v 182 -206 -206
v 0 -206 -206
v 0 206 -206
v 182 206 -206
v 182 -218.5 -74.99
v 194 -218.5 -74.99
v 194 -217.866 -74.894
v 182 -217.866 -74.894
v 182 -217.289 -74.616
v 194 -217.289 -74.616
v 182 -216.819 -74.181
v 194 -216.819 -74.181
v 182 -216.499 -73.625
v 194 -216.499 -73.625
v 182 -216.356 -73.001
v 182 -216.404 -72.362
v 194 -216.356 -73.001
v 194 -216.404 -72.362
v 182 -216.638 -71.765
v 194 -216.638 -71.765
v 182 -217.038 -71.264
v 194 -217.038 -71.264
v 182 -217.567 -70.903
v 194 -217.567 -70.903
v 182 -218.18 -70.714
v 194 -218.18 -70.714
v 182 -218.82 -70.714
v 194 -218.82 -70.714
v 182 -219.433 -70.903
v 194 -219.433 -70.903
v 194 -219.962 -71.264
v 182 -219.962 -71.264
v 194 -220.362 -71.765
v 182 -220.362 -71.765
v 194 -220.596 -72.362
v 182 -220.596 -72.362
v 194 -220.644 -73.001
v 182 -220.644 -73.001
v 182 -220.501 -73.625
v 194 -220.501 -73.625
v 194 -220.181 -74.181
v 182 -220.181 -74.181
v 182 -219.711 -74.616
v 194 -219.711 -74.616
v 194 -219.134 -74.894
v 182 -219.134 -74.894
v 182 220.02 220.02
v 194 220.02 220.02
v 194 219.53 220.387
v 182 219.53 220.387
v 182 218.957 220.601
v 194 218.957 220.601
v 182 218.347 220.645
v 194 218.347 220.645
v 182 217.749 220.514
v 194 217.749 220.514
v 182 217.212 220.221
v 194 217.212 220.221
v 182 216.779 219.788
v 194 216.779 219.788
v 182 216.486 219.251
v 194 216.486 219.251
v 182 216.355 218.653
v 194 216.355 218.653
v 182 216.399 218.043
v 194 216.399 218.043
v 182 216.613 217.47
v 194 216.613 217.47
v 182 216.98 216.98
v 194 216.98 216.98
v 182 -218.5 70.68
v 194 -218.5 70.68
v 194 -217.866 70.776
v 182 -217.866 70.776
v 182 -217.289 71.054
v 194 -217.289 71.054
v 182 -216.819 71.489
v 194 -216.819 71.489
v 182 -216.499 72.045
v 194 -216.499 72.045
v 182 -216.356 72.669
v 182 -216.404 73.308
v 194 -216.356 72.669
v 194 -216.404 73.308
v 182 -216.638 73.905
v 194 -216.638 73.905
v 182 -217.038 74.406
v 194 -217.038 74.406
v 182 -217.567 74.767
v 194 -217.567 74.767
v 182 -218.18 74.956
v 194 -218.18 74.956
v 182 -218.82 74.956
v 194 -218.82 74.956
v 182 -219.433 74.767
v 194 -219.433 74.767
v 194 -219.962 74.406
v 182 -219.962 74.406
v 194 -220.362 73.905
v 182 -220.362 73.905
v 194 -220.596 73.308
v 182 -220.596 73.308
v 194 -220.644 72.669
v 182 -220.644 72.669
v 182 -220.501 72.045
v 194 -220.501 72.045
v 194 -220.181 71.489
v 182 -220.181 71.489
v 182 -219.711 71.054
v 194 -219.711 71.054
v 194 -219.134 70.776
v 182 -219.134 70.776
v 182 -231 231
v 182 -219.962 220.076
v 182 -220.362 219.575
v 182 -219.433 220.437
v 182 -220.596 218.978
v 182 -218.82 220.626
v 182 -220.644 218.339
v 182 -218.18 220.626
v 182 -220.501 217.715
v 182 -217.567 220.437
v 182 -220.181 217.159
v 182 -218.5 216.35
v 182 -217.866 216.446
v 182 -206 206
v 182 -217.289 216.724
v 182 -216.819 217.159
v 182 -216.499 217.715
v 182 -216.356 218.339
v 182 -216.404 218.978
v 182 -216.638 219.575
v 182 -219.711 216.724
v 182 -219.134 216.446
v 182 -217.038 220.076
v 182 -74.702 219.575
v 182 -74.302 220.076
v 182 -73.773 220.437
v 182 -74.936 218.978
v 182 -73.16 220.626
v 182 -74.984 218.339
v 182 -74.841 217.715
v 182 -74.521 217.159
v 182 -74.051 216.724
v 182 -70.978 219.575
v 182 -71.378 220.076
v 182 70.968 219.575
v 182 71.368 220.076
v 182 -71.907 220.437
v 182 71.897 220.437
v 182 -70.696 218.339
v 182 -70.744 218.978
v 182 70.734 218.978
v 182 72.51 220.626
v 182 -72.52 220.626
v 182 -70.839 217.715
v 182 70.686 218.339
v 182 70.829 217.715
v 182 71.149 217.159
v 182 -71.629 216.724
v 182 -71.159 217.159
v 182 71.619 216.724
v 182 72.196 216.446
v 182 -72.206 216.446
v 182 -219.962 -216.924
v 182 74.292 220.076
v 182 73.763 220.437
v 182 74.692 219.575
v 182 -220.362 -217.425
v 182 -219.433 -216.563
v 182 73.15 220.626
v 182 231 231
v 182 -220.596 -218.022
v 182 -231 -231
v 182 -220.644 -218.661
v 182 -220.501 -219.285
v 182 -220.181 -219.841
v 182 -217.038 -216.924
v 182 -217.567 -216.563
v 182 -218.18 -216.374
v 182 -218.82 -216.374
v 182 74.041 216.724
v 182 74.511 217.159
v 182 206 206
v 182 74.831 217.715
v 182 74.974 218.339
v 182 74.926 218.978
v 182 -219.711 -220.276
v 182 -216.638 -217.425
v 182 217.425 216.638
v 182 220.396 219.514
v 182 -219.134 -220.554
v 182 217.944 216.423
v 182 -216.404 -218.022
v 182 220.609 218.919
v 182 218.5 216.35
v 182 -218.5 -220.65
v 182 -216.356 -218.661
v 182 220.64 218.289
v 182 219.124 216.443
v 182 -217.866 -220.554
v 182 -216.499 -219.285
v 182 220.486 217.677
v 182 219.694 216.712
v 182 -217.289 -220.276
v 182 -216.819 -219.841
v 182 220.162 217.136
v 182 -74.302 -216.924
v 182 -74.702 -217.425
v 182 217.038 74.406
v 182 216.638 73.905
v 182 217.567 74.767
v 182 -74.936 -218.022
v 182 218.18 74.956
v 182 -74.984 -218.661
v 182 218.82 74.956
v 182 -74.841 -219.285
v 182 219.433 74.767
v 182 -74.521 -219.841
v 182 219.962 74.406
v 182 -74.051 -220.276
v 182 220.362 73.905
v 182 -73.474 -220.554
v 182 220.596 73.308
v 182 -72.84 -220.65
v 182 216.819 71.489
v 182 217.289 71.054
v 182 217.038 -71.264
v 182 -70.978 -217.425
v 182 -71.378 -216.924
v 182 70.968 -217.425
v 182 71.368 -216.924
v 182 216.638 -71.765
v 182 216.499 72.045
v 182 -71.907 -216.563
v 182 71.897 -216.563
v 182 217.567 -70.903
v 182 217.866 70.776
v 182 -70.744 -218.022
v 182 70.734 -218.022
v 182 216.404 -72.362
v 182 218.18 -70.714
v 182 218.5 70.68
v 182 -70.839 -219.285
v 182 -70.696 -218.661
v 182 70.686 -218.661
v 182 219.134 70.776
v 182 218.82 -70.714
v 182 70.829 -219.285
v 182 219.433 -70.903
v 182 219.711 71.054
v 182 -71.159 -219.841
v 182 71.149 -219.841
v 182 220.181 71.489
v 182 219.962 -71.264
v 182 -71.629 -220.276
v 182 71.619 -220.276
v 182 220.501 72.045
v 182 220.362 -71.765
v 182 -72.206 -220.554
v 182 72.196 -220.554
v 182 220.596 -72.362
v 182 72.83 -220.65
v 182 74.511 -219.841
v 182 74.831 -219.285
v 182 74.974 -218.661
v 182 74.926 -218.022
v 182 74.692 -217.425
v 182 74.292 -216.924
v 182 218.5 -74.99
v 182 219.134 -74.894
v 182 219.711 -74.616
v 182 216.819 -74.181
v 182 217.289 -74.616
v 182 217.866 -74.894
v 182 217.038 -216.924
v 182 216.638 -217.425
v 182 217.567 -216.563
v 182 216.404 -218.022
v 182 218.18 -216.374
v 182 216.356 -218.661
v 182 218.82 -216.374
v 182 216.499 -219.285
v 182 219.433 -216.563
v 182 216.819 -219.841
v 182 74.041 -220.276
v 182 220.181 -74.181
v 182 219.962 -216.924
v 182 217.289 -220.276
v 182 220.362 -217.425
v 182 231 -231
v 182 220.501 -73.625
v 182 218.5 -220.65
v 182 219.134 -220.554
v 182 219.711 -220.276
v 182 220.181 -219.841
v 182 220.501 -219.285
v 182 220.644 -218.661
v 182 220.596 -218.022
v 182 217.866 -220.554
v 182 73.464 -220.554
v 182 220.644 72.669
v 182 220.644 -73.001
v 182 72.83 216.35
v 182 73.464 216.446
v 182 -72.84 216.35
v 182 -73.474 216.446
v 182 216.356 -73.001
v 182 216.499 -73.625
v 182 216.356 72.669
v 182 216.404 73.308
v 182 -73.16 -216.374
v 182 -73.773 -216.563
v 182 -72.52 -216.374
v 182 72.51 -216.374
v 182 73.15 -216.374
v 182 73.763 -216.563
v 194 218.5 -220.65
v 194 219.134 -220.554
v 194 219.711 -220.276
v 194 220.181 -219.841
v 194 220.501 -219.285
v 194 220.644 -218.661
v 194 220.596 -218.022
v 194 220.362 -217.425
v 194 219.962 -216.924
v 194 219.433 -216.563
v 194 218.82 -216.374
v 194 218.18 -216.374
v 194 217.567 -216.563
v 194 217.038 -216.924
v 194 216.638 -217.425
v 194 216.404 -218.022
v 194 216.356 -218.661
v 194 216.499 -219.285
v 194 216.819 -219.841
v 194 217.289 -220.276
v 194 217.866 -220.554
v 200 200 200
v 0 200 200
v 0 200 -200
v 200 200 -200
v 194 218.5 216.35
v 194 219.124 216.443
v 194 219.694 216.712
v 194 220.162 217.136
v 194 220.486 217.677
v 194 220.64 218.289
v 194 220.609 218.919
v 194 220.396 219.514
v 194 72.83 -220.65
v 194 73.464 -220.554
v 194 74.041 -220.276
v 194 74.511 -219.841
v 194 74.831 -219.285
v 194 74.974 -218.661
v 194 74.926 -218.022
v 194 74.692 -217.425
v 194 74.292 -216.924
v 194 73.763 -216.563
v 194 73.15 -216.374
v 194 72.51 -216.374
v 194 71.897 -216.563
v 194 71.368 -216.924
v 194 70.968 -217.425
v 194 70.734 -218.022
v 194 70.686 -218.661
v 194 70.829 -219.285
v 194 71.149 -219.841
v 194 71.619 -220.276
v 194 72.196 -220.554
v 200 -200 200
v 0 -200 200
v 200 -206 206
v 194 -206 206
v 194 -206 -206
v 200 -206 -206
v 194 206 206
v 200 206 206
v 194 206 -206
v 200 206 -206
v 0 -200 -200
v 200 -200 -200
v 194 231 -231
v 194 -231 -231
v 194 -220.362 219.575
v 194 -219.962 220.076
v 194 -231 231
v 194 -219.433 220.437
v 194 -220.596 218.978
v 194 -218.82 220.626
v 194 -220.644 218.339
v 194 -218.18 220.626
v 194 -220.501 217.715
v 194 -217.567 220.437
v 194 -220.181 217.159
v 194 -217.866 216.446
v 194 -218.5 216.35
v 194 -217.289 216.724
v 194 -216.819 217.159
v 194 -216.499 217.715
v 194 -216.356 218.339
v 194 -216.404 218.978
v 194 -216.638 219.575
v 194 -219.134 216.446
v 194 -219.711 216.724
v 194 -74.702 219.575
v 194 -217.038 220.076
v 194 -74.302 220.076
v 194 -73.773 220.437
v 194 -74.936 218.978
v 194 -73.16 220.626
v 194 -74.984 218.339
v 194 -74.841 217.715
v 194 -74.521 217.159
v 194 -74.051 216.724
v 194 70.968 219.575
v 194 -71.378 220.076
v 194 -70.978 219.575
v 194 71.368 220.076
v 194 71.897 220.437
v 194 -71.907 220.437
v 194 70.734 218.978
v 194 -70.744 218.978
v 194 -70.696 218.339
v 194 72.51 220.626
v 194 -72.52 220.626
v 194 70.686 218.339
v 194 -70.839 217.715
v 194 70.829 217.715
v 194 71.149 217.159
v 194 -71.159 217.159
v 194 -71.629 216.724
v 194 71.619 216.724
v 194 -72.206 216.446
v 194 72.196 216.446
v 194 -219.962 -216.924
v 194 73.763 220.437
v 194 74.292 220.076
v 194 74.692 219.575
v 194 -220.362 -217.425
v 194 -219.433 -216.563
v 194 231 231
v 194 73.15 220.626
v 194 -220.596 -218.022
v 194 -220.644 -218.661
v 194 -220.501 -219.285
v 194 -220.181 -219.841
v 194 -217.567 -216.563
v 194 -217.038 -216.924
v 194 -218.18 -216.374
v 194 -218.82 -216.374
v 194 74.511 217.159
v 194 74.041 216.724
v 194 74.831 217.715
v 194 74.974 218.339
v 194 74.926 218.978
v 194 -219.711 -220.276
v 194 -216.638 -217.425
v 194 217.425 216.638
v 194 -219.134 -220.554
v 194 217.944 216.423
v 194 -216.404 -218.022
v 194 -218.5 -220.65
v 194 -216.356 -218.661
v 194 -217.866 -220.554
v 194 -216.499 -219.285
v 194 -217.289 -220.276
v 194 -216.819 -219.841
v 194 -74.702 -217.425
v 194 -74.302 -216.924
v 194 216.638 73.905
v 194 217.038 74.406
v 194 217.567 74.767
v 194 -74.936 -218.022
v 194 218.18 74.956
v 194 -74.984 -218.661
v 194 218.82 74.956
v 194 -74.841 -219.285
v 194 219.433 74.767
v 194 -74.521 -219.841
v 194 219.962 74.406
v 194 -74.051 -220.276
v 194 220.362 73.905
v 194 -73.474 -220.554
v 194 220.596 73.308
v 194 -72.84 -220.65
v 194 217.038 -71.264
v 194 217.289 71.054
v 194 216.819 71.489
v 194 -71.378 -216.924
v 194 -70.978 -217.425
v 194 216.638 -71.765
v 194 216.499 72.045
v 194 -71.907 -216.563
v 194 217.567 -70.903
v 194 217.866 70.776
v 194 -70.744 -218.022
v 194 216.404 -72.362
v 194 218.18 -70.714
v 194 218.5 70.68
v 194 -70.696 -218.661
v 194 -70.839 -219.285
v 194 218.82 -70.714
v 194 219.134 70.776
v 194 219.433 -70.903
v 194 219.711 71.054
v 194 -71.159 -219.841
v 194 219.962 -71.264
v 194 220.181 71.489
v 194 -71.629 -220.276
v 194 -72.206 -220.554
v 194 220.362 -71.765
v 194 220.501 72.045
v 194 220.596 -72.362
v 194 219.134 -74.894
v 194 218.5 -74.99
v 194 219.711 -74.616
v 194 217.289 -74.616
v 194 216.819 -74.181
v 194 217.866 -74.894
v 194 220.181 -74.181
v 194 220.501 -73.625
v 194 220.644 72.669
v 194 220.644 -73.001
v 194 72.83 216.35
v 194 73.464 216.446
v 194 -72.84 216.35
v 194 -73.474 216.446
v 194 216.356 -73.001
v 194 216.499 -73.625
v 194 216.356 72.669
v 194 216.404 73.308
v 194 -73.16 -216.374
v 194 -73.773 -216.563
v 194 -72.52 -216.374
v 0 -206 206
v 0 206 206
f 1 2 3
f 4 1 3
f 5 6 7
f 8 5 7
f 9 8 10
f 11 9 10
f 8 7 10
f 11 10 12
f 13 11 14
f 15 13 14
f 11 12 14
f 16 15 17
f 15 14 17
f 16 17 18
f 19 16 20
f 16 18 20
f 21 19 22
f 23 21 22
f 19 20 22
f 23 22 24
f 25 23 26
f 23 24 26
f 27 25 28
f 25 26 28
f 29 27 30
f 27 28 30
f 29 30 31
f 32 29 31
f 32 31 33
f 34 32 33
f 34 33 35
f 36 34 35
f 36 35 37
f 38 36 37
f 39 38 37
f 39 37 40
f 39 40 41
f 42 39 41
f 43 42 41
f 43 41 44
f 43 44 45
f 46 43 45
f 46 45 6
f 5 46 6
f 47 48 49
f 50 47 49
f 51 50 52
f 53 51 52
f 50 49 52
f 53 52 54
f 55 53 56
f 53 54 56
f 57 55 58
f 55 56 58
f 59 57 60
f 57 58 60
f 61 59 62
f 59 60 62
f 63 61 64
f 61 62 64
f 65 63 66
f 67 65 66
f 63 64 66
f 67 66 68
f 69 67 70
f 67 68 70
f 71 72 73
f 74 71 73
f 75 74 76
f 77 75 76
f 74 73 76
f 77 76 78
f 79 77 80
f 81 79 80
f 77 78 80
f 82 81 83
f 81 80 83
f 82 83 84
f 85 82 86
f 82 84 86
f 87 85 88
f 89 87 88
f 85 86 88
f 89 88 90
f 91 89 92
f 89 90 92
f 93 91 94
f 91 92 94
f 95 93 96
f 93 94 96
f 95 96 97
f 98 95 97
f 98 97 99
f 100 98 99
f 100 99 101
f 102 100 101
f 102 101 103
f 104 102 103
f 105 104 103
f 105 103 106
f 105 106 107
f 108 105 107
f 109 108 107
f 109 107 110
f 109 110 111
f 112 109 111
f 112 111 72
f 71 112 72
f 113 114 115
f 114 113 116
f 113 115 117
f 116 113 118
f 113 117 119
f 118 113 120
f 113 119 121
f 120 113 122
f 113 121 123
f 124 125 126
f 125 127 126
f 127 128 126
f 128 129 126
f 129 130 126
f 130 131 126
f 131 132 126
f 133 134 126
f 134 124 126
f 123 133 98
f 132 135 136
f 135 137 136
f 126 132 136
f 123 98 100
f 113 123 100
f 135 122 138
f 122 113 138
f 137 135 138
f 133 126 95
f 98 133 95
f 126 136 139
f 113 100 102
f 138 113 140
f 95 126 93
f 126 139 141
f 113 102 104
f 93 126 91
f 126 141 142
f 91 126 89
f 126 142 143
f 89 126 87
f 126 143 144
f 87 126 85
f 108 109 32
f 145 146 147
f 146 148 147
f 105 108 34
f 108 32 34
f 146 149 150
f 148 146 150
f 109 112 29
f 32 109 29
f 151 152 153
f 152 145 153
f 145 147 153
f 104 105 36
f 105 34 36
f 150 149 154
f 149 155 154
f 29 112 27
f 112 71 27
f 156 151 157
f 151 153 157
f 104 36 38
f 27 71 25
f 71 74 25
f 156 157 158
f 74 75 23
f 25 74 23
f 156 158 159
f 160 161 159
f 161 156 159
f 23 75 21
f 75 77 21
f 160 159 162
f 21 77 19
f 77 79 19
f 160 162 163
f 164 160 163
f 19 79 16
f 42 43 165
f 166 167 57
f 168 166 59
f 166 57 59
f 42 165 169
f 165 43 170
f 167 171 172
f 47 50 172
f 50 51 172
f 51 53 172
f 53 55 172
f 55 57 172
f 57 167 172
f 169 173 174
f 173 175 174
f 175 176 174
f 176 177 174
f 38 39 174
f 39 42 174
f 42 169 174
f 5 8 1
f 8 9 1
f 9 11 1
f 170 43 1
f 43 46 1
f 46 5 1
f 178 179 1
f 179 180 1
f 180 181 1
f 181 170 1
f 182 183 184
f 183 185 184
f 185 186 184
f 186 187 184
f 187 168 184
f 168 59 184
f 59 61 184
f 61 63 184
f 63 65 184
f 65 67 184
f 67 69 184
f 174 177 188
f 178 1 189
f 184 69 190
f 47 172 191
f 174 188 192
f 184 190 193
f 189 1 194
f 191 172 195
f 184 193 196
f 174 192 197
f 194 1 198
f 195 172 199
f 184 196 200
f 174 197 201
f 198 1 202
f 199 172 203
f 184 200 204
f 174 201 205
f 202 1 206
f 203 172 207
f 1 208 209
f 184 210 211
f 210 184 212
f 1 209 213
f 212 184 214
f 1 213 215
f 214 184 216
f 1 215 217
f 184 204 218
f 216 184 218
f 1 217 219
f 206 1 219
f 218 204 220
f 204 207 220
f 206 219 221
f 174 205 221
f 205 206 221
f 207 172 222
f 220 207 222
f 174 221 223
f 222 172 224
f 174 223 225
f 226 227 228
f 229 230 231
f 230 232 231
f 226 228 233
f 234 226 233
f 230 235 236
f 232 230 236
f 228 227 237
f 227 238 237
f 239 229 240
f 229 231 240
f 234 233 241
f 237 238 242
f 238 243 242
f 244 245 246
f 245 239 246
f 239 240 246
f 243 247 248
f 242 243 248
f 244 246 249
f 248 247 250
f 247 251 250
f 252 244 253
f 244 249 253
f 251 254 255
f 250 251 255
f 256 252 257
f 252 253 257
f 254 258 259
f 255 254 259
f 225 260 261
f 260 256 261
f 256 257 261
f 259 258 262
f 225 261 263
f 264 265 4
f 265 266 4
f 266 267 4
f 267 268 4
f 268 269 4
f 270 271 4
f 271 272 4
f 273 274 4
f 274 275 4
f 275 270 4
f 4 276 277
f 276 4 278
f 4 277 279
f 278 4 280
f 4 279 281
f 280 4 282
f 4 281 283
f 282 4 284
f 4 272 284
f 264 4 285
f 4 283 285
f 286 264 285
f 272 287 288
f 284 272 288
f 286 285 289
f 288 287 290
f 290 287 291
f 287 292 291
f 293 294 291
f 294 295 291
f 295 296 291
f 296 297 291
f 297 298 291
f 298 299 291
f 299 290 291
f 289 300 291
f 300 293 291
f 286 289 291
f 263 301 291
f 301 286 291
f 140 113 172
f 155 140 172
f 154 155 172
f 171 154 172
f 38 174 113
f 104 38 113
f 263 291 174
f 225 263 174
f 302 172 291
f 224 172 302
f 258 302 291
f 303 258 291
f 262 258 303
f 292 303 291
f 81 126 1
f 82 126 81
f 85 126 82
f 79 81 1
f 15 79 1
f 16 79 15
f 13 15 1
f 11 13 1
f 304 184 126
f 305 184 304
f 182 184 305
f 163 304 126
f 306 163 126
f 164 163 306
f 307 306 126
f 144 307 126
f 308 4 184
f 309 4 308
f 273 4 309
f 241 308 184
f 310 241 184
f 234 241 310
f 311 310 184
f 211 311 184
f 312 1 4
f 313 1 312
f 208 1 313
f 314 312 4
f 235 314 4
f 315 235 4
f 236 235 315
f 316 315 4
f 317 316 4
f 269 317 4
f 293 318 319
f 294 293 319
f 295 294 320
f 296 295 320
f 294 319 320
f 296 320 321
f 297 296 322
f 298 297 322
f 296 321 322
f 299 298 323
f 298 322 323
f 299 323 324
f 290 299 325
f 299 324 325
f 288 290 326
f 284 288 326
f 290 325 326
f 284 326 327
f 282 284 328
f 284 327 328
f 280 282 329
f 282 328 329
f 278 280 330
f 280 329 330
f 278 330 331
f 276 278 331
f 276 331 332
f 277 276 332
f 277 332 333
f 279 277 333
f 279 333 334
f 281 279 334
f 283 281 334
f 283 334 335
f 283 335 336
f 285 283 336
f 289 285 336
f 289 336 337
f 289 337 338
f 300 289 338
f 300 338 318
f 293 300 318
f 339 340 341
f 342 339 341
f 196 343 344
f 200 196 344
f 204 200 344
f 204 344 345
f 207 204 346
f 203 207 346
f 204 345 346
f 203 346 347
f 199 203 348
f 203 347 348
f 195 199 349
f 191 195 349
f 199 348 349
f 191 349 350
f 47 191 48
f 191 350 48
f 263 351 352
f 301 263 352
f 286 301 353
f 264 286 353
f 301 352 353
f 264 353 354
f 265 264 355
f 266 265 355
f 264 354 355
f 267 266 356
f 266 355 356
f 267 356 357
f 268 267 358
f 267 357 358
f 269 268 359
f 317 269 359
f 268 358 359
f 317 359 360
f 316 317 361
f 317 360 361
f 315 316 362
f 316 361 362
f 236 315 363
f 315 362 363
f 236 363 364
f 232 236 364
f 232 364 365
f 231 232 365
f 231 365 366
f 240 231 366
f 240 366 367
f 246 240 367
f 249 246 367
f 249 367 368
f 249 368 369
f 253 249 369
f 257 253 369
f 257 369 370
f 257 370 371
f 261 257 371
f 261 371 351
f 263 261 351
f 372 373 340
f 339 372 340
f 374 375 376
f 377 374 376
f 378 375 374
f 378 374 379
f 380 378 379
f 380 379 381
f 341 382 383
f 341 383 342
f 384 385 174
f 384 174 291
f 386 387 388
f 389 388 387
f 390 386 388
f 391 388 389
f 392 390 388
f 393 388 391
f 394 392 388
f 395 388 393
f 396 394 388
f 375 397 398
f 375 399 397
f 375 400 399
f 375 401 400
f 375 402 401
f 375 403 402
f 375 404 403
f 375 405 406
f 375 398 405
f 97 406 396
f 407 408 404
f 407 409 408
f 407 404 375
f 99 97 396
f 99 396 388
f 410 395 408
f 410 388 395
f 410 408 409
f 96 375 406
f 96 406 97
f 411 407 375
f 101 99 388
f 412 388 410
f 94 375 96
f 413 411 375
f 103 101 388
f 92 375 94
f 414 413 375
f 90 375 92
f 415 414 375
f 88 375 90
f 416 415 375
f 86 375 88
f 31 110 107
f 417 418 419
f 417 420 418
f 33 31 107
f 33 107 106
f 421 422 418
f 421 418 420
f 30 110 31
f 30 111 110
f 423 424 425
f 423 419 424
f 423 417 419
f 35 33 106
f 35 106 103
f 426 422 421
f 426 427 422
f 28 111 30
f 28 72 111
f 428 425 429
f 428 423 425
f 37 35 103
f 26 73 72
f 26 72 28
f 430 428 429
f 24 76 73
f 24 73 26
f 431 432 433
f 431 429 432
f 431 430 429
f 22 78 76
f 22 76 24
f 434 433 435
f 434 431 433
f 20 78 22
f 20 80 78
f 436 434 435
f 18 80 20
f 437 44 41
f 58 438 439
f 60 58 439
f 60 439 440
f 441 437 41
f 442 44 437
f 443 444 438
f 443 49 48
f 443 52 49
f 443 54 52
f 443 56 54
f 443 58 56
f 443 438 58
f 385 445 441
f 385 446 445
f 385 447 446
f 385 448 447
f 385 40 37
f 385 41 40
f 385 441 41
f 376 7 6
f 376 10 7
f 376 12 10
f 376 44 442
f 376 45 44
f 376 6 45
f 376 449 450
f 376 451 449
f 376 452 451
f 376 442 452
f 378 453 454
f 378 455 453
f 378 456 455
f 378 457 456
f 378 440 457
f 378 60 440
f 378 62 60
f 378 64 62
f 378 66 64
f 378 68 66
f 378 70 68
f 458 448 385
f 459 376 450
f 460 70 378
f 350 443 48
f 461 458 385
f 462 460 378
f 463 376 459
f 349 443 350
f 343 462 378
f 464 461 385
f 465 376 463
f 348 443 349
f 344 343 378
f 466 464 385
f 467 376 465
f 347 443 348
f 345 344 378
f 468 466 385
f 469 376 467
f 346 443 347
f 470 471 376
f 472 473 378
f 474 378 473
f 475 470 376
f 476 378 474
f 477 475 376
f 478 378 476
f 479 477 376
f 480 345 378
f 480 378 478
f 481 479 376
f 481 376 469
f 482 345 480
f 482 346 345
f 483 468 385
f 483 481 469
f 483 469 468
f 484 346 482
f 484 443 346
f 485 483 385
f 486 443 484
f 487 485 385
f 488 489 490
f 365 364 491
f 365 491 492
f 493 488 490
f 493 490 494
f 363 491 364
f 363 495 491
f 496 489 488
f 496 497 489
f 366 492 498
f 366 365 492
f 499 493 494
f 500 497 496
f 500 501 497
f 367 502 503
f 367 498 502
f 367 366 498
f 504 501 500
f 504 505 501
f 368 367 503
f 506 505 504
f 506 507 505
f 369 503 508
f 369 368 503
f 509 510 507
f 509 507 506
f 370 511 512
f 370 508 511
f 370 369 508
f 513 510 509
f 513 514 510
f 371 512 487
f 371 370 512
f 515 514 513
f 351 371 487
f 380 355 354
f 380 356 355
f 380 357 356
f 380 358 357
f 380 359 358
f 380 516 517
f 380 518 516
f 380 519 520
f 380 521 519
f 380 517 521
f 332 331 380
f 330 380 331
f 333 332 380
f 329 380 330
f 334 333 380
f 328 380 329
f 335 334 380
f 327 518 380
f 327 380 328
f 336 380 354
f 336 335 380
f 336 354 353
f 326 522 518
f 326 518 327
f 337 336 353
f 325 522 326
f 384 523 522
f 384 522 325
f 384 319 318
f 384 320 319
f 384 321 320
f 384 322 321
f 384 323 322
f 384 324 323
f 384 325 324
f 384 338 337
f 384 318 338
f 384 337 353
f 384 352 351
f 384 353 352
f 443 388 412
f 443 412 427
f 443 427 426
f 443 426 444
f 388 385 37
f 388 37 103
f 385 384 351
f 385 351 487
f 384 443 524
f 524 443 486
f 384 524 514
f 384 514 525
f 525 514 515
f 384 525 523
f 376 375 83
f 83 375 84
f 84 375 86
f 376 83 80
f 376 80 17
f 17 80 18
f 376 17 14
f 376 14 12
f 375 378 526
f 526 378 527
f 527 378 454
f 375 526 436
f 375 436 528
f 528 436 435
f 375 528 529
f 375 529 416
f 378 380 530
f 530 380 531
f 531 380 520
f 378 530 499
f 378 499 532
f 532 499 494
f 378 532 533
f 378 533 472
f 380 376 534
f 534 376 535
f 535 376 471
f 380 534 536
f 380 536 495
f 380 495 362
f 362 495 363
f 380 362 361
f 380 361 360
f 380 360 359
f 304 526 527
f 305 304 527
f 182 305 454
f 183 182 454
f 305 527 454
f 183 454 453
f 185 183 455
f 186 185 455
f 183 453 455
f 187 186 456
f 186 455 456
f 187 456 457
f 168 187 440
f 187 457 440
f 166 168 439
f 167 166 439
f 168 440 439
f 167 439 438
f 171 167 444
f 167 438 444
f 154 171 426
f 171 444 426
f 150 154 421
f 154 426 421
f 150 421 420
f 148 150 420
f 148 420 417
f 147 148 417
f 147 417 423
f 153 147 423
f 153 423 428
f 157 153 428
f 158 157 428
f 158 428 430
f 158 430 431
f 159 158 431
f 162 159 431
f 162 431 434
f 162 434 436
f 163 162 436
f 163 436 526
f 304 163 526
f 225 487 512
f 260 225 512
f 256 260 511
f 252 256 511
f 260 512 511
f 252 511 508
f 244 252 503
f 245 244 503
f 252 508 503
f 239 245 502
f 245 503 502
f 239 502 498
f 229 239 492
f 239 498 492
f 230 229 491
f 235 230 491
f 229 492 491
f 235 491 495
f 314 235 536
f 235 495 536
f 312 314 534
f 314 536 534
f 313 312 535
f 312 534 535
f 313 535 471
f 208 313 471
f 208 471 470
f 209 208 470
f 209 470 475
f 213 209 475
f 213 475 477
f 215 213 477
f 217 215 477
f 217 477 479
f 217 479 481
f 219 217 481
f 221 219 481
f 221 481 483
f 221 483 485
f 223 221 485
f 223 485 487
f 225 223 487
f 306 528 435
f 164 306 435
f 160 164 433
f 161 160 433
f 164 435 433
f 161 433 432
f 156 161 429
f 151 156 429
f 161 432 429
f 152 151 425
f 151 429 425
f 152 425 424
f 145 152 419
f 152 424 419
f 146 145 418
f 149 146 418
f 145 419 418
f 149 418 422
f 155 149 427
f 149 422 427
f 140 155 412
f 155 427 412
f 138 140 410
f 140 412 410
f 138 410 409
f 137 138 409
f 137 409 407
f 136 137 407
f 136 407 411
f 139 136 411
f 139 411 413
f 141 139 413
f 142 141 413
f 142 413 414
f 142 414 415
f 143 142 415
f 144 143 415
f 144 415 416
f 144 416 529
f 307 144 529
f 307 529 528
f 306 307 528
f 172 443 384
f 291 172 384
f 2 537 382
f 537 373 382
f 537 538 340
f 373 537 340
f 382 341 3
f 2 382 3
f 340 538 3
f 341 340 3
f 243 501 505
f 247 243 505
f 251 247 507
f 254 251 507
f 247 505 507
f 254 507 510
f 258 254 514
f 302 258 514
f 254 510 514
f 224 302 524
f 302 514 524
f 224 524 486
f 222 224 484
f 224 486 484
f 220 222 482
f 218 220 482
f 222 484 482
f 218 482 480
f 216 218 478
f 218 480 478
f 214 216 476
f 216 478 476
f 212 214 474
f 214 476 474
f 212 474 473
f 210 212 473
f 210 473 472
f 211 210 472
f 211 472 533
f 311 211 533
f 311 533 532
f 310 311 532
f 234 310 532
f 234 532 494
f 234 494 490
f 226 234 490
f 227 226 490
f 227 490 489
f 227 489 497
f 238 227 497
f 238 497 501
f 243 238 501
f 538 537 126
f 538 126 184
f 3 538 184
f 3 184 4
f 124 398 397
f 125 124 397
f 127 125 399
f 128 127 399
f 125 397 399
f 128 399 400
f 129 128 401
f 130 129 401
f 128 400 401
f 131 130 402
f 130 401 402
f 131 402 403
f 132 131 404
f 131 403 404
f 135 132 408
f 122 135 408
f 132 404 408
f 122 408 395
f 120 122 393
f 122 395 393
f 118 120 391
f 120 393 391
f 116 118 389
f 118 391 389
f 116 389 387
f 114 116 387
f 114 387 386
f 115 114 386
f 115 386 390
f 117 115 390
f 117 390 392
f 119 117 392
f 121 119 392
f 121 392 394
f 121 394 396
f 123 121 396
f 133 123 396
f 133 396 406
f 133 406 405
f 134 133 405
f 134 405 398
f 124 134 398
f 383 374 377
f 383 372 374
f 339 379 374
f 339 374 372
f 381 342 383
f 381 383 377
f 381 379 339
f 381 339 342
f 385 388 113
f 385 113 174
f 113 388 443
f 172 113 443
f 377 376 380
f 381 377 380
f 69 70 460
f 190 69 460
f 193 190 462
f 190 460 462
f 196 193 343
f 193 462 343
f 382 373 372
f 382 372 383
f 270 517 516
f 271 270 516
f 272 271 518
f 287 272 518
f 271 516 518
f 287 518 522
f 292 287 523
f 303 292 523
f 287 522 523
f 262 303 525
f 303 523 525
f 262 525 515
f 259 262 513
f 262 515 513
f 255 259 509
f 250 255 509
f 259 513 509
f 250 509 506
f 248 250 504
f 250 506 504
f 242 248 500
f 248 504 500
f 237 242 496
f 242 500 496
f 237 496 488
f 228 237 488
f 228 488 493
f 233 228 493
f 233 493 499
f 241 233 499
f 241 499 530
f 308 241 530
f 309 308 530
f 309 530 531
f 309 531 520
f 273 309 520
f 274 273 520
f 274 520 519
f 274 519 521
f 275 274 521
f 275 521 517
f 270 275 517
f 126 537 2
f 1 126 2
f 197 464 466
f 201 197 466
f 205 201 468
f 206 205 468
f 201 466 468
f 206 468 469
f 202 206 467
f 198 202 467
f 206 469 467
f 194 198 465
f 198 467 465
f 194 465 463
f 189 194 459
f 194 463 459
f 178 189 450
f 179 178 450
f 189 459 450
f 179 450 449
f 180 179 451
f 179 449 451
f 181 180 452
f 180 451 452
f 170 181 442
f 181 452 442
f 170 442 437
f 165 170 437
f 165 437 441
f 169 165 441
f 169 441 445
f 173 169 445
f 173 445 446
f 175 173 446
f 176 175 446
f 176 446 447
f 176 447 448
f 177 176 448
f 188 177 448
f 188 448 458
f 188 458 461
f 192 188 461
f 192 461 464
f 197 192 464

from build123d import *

# Parameters (mm, degrees)
SKETCH1_W           = 412
SKETCH1_H           = 412
SKETCH1_W_2         = 400
SKETCH1_H_2         = 400
EXTRUDE_THIN1_DEPTH = 200
SKETCH5_W           = 462
SKETCH5_H           = 462
SKETCH5_W_2         = 412
SKETCH5_H_2         = 412
EXTRUDE_THIN2_DEPTH = 12
SKETCH6_R           = 2.15
CUT_EXTRUDE1_DEPTH  = 380.944732823


with BuildPart() as part:
    # Sketch1 → Extrude-Thin1 (new body)
    with BuildSketch(Plane(origin=(0, 0, 0), x_dir=(0, 0, -1), z_dir=(1, 0, 0))):
        Rectangle(SKETCH1_W, SKETCH1_H)
        Rectangle(SKETCH1_W_2, SKETCH1_H_2, mode=Mode.SUBTRACT)
    extrude(amount=EXTRUDE_THIN1_DEPTH)

    # Sketch5 → Extrude-Thin2 (add)
    with BuildSketch(Plane(origin=(194, 0, 0), x_dir=(0, 0, -1), z_dir=(1, 0, 0))):
        Rectangle(SKETCH5_W, SKETCH5_H)
        Rectangle(SKETCH5_W_2, SKETCH5_H_2, mode=Mode.SUBTRACT)
    extrude(amount=-EXTRUDE_THIN2_DEPTH)

    # Sketch6 → Cut-Extrude1 (cut, through all)
    with BuildSketch(Plane(origin=(194, 0, 0), x_dir=(0, 0, -1), z_dir=(1, 0, 0))):
        with BuildLine():
            ThreePointArc((-216.35, 218.5), (-217.67723062, 220.486340995), (-220.02027958, 220.02027958))
            Line((-220.02027958, 220.02027958), (-216.97972042, 216.97972042))
            ThreePointArc((-216.97972042, 216.97972042), (-216.513659005, 217.67723062), (-216.35, 218.5))
        make_face()
        with BuildLine():
            Line((-216.97972042, 216.97972042), (-220.02027958, 220.02027958))
            ThreePointArc((-220.02027958, 220.02027958), (-220.02027958, 216.97972042), (-216.97972042, 216.97972042))
        make_face()
        with Locations((-72.83, 218.5)):
            Circle(SKETCH6_R)
        with Locations((72.84, 218.5)):
            Circle(SKETCH6_R)
        with Locations((-218.5, -72.84)):
            Circle(SKETCH6_R)
        with Locations((-72.83, -218.5)):
            Circle(SKETCH6_R)
        with Locations((72.84, -218.5)):
            Circle(SKETCH6_R)
        with Locations((218.5, -72.84)):
            Circle(SKETCH6_R)
        with Locations((-218.5, 72.83)):
            Circle(SKETCH6_R)
        with Locations((-218.5, -218.5)):
            Circle(SKETCH6_R)
        with Locations((218.5, -218.5)):
            Circle(SKETCH6_R)
        with Locations((218.5, 72.83)):
            Circle(SKETCH6_R)
        with Locations((218.5, 218.5)):
            Circle(SKETCH6_R)
    extrude(amount=-CUT_EXTRUDE1_DEPTH, mode=Mode.SUBTRACT)


solid = part.part
